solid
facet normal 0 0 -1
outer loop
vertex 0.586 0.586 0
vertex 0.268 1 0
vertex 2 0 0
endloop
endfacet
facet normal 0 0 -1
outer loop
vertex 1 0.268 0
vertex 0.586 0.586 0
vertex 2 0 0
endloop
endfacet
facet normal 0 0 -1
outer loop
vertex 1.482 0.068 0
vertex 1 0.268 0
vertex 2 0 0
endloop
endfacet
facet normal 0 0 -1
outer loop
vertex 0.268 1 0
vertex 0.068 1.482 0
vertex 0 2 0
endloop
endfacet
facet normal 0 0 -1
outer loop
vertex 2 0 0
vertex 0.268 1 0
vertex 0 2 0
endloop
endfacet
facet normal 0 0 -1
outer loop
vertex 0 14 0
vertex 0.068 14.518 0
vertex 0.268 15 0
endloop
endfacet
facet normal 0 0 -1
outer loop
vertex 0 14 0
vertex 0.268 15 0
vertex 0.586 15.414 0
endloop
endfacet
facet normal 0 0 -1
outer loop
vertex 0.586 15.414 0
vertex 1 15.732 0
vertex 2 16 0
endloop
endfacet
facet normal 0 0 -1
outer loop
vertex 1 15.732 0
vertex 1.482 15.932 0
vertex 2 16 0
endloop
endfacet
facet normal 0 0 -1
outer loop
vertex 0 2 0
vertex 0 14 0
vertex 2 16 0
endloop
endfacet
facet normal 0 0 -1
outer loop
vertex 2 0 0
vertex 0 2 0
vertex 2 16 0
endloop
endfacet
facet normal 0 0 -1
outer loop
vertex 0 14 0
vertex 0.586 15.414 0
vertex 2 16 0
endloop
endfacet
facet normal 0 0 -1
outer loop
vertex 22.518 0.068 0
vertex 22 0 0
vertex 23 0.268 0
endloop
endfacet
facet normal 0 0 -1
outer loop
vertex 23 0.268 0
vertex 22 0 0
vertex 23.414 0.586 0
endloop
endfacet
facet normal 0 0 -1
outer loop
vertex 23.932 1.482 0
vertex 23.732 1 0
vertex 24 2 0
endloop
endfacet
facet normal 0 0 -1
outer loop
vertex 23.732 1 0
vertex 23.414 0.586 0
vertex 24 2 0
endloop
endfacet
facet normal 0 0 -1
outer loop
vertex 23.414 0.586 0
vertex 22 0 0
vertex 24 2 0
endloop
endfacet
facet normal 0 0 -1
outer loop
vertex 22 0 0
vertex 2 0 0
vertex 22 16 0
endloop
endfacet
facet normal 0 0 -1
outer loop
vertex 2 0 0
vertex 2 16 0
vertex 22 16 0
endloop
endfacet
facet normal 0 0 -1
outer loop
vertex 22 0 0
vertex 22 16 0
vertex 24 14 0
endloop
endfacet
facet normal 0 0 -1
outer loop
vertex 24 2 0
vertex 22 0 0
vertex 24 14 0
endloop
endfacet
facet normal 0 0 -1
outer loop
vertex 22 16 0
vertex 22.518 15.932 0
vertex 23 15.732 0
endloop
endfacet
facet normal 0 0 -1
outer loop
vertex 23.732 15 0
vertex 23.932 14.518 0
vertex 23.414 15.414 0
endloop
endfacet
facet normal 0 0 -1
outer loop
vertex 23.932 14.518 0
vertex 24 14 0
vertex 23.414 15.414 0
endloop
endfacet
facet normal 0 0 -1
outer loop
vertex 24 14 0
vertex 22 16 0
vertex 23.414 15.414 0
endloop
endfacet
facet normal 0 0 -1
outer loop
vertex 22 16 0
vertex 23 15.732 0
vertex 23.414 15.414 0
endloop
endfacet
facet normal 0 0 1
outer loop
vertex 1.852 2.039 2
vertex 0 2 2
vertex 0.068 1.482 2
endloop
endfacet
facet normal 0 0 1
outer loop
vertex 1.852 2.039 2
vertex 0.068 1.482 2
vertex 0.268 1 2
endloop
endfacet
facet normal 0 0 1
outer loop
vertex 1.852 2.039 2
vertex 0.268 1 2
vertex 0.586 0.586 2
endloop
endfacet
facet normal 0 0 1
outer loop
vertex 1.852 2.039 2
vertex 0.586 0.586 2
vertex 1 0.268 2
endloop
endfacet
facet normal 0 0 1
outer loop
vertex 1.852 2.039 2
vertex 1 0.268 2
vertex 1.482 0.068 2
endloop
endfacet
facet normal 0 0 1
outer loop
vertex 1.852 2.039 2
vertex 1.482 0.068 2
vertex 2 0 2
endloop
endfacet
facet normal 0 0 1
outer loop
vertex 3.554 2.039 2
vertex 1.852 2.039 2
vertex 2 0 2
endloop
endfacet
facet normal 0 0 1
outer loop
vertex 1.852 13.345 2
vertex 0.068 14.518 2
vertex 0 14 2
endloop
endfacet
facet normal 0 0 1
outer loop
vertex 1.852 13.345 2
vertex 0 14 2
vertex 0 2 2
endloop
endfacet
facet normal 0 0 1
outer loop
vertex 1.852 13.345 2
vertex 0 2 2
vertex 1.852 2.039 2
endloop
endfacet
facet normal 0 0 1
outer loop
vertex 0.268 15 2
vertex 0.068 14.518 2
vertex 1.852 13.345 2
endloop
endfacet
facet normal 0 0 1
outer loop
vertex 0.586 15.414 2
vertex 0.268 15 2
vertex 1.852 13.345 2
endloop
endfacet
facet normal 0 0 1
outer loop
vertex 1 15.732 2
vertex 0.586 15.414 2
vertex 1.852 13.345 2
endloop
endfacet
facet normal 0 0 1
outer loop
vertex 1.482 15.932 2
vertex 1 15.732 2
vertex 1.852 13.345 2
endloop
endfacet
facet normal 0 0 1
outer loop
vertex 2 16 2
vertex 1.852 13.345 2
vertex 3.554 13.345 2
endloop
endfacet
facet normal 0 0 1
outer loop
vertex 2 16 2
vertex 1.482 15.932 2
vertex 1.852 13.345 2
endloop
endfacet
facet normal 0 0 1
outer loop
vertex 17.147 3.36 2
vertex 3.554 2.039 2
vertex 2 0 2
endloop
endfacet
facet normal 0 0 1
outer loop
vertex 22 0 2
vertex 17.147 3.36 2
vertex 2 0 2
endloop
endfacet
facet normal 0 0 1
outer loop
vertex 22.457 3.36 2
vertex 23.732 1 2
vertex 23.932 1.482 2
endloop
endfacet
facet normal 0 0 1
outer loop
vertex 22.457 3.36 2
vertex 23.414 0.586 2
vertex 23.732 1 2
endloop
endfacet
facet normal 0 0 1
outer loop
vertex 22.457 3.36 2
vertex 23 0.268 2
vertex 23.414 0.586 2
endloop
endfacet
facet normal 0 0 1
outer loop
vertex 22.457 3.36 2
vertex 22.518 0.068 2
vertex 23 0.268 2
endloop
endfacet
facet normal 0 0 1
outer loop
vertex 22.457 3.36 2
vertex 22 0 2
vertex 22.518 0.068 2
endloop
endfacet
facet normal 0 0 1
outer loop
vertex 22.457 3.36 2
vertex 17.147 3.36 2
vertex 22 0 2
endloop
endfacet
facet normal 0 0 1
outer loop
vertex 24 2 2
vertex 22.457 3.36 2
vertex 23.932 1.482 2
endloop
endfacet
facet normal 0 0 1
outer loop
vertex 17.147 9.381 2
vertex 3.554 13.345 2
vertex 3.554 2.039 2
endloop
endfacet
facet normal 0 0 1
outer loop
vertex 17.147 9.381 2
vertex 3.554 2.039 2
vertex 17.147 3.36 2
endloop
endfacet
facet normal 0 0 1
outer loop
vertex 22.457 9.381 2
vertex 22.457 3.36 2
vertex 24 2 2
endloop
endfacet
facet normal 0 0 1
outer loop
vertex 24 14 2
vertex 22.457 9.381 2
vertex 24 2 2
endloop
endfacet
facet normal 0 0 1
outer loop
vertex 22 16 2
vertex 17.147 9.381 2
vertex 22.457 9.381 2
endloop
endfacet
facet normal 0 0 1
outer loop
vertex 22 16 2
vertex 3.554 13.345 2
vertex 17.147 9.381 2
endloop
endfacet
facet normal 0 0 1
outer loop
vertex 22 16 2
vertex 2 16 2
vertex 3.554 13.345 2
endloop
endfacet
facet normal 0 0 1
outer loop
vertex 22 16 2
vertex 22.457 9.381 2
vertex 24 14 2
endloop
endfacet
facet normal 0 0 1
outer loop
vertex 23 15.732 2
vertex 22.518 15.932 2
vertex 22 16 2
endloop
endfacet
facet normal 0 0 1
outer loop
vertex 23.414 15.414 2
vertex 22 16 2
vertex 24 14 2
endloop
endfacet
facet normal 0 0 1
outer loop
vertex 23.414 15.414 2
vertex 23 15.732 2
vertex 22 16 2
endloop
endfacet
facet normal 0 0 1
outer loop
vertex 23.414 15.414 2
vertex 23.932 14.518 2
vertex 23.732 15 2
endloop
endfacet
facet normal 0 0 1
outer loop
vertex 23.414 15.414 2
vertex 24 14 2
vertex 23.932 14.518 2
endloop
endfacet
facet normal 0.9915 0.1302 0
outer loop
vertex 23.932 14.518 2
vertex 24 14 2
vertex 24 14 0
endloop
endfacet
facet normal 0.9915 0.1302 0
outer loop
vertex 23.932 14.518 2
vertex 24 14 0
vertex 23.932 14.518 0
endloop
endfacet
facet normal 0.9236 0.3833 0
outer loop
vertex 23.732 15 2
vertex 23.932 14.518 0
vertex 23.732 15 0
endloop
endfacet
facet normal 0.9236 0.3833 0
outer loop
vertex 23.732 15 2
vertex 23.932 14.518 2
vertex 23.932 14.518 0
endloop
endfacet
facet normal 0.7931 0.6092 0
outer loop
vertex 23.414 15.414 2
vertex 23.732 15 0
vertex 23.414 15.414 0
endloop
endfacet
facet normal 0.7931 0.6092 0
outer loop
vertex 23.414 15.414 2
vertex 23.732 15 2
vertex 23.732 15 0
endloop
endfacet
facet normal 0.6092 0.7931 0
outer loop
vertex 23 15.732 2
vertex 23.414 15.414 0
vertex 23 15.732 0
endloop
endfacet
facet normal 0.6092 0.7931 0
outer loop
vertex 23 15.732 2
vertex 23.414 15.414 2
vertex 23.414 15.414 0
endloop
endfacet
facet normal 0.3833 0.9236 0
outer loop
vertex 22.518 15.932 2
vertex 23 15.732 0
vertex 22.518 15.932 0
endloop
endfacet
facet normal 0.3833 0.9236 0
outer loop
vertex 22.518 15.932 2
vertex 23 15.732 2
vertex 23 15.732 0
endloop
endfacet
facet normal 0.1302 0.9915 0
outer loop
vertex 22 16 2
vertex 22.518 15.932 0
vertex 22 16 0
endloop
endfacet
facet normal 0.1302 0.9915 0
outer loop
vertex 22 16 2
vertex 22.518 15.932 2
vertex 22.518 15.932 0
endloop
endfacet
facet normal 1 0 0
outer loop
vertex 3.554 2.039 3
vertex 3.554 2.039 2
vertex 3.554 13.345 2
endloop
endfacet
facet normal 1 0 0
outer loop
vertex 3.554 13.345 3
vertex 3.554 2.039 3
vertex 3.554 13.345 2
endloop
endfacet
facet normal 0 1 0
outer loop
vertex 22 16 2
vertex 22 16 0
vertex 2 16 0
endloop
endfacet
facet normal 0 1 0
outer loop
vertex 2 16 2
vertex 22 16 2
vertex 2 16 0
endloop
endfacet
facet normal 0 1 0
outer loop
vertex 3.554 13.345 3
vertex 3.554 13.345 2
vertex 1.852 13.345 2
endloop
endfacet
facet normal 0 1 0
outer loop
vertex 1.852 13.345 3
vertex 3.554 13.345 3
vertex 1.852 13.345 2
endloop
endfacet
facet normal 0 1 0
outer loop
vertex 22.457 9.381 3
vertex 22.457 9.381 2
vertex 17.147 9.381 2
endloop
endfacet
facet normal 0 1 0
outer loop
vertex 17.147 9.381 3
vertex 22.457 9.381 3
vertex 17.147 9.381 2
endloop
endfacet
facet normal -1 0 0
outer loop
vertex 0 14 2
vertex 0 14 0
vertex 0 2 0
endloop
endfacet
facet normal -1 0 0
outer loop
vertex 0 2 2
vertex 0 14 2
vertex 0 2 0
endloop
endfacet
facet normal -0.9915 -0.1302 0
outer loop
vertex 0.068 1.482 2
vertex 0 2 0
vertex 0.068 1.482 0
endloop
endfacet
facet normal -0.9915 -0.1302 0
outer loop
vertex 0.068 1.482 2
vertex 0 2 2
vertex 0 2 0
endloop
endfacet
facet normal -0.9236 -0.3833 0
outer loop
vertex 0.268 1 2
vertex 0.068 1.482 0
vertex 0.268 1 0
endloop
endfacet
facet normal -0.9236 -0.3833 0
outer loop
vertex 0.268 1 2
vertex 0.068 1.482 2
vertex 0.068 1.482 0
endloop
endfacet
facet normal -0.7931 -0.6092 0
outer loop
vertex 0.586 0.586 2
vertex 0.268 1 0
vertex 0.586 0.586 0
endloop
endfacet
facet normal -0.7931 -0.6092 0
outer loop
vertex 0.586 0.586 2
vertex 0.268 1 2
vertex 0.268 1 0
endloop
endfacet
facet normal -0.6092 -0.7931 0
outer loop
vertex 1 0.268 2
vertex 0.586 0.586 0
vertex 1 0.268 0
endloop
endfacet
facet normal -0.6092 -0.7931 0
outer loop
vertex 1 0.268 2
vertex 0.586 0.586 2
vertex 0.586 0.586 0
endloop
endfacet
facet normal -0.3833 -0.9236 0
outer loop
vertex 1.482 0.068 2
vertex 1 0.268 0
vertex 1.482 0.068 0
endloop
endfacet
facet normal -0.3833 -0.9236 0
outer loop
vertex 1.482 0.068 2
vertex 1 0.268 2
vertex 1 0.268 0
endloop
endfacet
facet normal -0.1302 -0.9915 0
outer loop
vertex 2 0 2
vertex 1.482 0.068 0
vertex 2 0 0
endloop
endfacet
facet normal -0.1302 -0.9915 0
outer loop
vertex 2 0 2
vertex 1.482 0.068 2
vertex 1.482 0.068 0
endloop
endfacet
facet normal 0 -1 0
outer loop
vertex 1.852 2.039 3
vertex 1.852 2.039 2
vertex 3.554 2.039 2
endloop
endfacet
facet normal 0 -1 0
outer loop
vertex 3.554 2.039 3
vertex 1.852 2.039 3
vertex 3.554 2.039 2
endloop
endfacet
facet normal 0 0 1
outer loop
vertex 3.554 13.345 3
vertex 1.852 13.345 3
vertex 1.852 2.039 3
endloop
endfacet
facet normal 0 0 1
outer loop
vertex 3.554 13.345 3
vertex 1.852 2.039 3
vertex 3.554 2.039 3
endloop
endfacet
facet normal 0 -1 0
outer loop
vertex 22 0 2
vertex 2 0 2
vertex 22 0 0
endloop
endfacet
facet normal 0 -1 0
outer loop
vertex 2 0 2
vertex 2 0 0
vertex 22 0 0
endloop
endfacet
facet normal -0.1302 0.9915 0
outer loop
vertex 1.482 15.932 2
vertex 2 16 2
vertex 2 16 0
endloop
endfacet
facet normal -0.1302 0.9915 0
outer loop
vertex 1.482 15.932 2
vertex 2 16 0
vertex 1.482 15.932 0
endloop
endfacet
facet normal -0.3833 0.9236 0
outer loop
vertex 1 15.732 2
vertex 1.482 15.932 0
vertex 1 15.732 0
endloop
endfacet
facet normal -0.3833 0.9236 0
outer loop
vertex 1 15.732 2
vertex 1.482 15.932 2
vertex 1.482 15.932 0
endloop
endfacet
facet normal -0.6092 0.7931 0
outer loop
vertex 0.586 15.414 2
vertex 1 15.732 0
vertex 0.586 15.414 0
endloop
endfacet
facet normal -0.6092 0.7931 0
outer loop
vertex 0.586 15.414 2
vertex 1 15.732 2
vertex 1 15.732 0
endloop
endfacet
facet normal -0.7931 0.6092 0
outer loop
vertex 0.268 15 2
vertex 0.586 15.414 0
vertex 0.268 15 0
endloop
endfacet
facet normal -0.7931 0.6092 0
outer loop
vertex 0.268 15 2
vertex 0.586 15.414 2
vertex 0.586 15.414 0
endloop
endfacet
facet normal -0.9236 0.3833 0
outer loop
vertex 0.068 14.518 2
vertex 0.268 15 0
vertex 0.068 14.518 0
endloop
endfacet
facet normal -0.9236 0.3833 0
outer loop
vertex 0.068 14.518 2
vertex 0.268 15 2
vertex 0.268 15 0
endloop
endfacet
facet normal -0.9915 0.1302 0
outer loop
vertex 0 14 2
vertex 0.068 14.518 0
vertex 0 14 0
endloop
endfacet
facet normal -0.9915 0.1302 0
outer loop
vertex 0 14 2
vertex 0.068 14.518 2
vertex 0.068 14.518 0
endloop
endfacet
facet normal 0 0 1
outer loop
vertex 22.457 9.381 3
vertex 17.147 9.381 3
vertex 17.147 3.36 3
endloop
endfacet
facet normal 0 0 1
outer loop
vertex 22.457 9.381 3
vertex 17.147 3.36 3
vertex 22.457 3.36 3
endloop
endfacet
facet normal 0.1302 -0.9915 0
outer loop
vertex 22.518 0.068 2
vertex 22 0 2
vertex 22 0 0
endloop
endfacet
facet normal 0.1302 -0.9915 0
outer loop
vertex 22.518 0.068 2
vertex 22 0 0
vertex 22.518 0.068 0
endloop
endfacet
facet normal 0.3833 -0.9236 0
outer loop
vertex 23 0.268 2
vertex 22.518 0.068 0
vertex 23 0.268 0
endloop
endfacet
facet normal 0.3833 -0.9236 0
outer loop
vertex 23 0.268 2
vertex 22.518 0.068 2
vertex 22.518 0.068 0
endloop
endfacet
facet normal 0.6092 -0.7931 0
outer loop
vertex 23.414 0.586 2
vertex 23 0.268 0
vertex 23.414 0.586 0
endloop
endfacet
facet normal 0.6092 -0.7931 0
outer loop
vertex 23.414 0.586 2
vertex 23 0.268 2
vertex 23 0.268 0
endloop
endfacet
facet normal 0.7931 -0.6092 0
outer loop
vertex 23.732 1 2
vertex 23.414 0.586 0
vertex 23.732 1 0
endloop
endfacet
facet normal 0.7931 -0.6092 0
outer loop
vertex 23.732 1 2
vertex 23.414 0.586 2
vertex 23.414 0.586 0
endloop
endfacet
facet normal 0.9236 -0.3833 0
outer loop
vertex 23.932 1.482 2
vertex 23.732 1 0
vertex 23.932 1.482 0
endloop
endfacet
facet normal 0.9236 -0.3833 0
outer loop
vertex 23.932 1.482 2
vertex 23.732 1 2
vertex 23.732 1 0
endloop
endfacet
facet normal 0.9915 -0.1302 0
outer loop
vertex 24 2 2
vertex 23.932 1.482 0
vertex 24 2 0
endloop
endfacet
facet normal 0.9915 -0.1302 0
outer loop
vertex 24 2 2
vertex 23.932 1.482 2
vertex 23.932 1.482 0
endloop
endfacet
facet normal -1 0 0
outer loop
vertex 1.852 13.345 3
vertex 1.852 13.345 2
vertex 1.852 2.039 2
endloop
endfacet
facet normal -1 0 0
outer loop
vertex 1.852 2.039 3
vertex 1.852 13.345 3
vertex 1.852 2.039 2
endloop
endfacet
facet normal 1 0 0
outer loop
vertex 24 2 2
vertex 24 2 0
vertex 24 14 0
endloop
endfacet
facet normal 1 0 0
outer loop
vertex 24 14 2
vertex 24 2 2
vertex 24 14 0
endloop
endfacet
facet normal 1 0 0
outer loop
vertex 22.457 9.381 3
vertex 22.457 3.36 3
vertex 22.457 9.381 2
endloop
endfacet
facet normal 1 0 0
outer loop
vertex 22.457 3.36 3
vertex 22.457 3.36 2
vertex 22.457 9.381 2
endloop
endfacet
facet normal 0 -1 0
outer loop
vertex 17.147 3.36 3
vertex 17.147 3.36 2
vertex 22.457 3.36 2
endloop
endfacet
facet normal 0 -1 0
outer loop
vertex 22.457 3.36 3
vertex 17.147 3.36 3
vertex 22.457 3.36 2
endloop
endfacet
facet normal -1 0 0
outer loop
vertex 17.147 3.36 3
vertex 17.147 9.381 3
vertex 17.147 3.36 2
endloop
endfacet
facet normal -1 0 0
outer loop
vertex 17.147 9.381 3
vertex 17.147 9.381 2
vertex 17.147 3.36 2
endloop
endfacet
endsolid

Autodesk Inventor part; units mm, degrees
ref_plane "YZ Plane" through (0, 0, 0) normal (1, 0, 0) x (0, 1, 0)
ref_plane "XZ Plane" through (0, 0, 0) normal (0, 1, 0) x (-1, 0, 0)
ref_plane "XY Plane" through (0, 0, 0) normal (0, 0, 1) x (1, 0, 0)
sketch "Sketch1" plane through (0, 0, 0) normal (0, 0, 1) x (1, 0, 0)
  line L0 (0, 0) -> (24, 0)
  line L1 (24, 0) -> (24, 16)
  line L2 (24, 16) -> (0, 16)
  line L3 (0, 16) -> (0, 0)
  dimension "d0" = 24
  dimension "d1" = 16
extrude "Extrusion1" add sketch "Sketch1" along normal blind 2
fillet "Fillet1" radius 2 4 edges at (0, 16, 1) (0, 0, 1) (24, 0, 1) (24, 16, 1)
sketch "Sketch2" plane through (0, 0, 2) normal (0, 0, 1) x (1, 0, 0)
  line L0 (1.8518, 13.3448) -> (1.8518, 2.0387)
  line L1 (1.8518, 2.0387) -> (3.5541, 2.0387)
  line L2 (3.5541, 2.0387) -> (3.5541, 13.3448)
  line L3 (3.5541, 13.3448) -> (1.8518, 13.3448)
  line L4 (17.1468, 9.3813) -> (17.1468, 3.3599)
  line L5 (17.1468, 3.3599) -> (22.4569, 3.3599)
  line L6 (22.4569, 3.3599) -> (22.4569, 9.3813)
  line L7 (22.4569, 9.3813) -> (17.1468, 9.3813)
  point P0 (0, 0)
extrude "Extrusion2" add sketch "Sketch2" along normal blind 1
properties part number "AmplificadorFInal"
